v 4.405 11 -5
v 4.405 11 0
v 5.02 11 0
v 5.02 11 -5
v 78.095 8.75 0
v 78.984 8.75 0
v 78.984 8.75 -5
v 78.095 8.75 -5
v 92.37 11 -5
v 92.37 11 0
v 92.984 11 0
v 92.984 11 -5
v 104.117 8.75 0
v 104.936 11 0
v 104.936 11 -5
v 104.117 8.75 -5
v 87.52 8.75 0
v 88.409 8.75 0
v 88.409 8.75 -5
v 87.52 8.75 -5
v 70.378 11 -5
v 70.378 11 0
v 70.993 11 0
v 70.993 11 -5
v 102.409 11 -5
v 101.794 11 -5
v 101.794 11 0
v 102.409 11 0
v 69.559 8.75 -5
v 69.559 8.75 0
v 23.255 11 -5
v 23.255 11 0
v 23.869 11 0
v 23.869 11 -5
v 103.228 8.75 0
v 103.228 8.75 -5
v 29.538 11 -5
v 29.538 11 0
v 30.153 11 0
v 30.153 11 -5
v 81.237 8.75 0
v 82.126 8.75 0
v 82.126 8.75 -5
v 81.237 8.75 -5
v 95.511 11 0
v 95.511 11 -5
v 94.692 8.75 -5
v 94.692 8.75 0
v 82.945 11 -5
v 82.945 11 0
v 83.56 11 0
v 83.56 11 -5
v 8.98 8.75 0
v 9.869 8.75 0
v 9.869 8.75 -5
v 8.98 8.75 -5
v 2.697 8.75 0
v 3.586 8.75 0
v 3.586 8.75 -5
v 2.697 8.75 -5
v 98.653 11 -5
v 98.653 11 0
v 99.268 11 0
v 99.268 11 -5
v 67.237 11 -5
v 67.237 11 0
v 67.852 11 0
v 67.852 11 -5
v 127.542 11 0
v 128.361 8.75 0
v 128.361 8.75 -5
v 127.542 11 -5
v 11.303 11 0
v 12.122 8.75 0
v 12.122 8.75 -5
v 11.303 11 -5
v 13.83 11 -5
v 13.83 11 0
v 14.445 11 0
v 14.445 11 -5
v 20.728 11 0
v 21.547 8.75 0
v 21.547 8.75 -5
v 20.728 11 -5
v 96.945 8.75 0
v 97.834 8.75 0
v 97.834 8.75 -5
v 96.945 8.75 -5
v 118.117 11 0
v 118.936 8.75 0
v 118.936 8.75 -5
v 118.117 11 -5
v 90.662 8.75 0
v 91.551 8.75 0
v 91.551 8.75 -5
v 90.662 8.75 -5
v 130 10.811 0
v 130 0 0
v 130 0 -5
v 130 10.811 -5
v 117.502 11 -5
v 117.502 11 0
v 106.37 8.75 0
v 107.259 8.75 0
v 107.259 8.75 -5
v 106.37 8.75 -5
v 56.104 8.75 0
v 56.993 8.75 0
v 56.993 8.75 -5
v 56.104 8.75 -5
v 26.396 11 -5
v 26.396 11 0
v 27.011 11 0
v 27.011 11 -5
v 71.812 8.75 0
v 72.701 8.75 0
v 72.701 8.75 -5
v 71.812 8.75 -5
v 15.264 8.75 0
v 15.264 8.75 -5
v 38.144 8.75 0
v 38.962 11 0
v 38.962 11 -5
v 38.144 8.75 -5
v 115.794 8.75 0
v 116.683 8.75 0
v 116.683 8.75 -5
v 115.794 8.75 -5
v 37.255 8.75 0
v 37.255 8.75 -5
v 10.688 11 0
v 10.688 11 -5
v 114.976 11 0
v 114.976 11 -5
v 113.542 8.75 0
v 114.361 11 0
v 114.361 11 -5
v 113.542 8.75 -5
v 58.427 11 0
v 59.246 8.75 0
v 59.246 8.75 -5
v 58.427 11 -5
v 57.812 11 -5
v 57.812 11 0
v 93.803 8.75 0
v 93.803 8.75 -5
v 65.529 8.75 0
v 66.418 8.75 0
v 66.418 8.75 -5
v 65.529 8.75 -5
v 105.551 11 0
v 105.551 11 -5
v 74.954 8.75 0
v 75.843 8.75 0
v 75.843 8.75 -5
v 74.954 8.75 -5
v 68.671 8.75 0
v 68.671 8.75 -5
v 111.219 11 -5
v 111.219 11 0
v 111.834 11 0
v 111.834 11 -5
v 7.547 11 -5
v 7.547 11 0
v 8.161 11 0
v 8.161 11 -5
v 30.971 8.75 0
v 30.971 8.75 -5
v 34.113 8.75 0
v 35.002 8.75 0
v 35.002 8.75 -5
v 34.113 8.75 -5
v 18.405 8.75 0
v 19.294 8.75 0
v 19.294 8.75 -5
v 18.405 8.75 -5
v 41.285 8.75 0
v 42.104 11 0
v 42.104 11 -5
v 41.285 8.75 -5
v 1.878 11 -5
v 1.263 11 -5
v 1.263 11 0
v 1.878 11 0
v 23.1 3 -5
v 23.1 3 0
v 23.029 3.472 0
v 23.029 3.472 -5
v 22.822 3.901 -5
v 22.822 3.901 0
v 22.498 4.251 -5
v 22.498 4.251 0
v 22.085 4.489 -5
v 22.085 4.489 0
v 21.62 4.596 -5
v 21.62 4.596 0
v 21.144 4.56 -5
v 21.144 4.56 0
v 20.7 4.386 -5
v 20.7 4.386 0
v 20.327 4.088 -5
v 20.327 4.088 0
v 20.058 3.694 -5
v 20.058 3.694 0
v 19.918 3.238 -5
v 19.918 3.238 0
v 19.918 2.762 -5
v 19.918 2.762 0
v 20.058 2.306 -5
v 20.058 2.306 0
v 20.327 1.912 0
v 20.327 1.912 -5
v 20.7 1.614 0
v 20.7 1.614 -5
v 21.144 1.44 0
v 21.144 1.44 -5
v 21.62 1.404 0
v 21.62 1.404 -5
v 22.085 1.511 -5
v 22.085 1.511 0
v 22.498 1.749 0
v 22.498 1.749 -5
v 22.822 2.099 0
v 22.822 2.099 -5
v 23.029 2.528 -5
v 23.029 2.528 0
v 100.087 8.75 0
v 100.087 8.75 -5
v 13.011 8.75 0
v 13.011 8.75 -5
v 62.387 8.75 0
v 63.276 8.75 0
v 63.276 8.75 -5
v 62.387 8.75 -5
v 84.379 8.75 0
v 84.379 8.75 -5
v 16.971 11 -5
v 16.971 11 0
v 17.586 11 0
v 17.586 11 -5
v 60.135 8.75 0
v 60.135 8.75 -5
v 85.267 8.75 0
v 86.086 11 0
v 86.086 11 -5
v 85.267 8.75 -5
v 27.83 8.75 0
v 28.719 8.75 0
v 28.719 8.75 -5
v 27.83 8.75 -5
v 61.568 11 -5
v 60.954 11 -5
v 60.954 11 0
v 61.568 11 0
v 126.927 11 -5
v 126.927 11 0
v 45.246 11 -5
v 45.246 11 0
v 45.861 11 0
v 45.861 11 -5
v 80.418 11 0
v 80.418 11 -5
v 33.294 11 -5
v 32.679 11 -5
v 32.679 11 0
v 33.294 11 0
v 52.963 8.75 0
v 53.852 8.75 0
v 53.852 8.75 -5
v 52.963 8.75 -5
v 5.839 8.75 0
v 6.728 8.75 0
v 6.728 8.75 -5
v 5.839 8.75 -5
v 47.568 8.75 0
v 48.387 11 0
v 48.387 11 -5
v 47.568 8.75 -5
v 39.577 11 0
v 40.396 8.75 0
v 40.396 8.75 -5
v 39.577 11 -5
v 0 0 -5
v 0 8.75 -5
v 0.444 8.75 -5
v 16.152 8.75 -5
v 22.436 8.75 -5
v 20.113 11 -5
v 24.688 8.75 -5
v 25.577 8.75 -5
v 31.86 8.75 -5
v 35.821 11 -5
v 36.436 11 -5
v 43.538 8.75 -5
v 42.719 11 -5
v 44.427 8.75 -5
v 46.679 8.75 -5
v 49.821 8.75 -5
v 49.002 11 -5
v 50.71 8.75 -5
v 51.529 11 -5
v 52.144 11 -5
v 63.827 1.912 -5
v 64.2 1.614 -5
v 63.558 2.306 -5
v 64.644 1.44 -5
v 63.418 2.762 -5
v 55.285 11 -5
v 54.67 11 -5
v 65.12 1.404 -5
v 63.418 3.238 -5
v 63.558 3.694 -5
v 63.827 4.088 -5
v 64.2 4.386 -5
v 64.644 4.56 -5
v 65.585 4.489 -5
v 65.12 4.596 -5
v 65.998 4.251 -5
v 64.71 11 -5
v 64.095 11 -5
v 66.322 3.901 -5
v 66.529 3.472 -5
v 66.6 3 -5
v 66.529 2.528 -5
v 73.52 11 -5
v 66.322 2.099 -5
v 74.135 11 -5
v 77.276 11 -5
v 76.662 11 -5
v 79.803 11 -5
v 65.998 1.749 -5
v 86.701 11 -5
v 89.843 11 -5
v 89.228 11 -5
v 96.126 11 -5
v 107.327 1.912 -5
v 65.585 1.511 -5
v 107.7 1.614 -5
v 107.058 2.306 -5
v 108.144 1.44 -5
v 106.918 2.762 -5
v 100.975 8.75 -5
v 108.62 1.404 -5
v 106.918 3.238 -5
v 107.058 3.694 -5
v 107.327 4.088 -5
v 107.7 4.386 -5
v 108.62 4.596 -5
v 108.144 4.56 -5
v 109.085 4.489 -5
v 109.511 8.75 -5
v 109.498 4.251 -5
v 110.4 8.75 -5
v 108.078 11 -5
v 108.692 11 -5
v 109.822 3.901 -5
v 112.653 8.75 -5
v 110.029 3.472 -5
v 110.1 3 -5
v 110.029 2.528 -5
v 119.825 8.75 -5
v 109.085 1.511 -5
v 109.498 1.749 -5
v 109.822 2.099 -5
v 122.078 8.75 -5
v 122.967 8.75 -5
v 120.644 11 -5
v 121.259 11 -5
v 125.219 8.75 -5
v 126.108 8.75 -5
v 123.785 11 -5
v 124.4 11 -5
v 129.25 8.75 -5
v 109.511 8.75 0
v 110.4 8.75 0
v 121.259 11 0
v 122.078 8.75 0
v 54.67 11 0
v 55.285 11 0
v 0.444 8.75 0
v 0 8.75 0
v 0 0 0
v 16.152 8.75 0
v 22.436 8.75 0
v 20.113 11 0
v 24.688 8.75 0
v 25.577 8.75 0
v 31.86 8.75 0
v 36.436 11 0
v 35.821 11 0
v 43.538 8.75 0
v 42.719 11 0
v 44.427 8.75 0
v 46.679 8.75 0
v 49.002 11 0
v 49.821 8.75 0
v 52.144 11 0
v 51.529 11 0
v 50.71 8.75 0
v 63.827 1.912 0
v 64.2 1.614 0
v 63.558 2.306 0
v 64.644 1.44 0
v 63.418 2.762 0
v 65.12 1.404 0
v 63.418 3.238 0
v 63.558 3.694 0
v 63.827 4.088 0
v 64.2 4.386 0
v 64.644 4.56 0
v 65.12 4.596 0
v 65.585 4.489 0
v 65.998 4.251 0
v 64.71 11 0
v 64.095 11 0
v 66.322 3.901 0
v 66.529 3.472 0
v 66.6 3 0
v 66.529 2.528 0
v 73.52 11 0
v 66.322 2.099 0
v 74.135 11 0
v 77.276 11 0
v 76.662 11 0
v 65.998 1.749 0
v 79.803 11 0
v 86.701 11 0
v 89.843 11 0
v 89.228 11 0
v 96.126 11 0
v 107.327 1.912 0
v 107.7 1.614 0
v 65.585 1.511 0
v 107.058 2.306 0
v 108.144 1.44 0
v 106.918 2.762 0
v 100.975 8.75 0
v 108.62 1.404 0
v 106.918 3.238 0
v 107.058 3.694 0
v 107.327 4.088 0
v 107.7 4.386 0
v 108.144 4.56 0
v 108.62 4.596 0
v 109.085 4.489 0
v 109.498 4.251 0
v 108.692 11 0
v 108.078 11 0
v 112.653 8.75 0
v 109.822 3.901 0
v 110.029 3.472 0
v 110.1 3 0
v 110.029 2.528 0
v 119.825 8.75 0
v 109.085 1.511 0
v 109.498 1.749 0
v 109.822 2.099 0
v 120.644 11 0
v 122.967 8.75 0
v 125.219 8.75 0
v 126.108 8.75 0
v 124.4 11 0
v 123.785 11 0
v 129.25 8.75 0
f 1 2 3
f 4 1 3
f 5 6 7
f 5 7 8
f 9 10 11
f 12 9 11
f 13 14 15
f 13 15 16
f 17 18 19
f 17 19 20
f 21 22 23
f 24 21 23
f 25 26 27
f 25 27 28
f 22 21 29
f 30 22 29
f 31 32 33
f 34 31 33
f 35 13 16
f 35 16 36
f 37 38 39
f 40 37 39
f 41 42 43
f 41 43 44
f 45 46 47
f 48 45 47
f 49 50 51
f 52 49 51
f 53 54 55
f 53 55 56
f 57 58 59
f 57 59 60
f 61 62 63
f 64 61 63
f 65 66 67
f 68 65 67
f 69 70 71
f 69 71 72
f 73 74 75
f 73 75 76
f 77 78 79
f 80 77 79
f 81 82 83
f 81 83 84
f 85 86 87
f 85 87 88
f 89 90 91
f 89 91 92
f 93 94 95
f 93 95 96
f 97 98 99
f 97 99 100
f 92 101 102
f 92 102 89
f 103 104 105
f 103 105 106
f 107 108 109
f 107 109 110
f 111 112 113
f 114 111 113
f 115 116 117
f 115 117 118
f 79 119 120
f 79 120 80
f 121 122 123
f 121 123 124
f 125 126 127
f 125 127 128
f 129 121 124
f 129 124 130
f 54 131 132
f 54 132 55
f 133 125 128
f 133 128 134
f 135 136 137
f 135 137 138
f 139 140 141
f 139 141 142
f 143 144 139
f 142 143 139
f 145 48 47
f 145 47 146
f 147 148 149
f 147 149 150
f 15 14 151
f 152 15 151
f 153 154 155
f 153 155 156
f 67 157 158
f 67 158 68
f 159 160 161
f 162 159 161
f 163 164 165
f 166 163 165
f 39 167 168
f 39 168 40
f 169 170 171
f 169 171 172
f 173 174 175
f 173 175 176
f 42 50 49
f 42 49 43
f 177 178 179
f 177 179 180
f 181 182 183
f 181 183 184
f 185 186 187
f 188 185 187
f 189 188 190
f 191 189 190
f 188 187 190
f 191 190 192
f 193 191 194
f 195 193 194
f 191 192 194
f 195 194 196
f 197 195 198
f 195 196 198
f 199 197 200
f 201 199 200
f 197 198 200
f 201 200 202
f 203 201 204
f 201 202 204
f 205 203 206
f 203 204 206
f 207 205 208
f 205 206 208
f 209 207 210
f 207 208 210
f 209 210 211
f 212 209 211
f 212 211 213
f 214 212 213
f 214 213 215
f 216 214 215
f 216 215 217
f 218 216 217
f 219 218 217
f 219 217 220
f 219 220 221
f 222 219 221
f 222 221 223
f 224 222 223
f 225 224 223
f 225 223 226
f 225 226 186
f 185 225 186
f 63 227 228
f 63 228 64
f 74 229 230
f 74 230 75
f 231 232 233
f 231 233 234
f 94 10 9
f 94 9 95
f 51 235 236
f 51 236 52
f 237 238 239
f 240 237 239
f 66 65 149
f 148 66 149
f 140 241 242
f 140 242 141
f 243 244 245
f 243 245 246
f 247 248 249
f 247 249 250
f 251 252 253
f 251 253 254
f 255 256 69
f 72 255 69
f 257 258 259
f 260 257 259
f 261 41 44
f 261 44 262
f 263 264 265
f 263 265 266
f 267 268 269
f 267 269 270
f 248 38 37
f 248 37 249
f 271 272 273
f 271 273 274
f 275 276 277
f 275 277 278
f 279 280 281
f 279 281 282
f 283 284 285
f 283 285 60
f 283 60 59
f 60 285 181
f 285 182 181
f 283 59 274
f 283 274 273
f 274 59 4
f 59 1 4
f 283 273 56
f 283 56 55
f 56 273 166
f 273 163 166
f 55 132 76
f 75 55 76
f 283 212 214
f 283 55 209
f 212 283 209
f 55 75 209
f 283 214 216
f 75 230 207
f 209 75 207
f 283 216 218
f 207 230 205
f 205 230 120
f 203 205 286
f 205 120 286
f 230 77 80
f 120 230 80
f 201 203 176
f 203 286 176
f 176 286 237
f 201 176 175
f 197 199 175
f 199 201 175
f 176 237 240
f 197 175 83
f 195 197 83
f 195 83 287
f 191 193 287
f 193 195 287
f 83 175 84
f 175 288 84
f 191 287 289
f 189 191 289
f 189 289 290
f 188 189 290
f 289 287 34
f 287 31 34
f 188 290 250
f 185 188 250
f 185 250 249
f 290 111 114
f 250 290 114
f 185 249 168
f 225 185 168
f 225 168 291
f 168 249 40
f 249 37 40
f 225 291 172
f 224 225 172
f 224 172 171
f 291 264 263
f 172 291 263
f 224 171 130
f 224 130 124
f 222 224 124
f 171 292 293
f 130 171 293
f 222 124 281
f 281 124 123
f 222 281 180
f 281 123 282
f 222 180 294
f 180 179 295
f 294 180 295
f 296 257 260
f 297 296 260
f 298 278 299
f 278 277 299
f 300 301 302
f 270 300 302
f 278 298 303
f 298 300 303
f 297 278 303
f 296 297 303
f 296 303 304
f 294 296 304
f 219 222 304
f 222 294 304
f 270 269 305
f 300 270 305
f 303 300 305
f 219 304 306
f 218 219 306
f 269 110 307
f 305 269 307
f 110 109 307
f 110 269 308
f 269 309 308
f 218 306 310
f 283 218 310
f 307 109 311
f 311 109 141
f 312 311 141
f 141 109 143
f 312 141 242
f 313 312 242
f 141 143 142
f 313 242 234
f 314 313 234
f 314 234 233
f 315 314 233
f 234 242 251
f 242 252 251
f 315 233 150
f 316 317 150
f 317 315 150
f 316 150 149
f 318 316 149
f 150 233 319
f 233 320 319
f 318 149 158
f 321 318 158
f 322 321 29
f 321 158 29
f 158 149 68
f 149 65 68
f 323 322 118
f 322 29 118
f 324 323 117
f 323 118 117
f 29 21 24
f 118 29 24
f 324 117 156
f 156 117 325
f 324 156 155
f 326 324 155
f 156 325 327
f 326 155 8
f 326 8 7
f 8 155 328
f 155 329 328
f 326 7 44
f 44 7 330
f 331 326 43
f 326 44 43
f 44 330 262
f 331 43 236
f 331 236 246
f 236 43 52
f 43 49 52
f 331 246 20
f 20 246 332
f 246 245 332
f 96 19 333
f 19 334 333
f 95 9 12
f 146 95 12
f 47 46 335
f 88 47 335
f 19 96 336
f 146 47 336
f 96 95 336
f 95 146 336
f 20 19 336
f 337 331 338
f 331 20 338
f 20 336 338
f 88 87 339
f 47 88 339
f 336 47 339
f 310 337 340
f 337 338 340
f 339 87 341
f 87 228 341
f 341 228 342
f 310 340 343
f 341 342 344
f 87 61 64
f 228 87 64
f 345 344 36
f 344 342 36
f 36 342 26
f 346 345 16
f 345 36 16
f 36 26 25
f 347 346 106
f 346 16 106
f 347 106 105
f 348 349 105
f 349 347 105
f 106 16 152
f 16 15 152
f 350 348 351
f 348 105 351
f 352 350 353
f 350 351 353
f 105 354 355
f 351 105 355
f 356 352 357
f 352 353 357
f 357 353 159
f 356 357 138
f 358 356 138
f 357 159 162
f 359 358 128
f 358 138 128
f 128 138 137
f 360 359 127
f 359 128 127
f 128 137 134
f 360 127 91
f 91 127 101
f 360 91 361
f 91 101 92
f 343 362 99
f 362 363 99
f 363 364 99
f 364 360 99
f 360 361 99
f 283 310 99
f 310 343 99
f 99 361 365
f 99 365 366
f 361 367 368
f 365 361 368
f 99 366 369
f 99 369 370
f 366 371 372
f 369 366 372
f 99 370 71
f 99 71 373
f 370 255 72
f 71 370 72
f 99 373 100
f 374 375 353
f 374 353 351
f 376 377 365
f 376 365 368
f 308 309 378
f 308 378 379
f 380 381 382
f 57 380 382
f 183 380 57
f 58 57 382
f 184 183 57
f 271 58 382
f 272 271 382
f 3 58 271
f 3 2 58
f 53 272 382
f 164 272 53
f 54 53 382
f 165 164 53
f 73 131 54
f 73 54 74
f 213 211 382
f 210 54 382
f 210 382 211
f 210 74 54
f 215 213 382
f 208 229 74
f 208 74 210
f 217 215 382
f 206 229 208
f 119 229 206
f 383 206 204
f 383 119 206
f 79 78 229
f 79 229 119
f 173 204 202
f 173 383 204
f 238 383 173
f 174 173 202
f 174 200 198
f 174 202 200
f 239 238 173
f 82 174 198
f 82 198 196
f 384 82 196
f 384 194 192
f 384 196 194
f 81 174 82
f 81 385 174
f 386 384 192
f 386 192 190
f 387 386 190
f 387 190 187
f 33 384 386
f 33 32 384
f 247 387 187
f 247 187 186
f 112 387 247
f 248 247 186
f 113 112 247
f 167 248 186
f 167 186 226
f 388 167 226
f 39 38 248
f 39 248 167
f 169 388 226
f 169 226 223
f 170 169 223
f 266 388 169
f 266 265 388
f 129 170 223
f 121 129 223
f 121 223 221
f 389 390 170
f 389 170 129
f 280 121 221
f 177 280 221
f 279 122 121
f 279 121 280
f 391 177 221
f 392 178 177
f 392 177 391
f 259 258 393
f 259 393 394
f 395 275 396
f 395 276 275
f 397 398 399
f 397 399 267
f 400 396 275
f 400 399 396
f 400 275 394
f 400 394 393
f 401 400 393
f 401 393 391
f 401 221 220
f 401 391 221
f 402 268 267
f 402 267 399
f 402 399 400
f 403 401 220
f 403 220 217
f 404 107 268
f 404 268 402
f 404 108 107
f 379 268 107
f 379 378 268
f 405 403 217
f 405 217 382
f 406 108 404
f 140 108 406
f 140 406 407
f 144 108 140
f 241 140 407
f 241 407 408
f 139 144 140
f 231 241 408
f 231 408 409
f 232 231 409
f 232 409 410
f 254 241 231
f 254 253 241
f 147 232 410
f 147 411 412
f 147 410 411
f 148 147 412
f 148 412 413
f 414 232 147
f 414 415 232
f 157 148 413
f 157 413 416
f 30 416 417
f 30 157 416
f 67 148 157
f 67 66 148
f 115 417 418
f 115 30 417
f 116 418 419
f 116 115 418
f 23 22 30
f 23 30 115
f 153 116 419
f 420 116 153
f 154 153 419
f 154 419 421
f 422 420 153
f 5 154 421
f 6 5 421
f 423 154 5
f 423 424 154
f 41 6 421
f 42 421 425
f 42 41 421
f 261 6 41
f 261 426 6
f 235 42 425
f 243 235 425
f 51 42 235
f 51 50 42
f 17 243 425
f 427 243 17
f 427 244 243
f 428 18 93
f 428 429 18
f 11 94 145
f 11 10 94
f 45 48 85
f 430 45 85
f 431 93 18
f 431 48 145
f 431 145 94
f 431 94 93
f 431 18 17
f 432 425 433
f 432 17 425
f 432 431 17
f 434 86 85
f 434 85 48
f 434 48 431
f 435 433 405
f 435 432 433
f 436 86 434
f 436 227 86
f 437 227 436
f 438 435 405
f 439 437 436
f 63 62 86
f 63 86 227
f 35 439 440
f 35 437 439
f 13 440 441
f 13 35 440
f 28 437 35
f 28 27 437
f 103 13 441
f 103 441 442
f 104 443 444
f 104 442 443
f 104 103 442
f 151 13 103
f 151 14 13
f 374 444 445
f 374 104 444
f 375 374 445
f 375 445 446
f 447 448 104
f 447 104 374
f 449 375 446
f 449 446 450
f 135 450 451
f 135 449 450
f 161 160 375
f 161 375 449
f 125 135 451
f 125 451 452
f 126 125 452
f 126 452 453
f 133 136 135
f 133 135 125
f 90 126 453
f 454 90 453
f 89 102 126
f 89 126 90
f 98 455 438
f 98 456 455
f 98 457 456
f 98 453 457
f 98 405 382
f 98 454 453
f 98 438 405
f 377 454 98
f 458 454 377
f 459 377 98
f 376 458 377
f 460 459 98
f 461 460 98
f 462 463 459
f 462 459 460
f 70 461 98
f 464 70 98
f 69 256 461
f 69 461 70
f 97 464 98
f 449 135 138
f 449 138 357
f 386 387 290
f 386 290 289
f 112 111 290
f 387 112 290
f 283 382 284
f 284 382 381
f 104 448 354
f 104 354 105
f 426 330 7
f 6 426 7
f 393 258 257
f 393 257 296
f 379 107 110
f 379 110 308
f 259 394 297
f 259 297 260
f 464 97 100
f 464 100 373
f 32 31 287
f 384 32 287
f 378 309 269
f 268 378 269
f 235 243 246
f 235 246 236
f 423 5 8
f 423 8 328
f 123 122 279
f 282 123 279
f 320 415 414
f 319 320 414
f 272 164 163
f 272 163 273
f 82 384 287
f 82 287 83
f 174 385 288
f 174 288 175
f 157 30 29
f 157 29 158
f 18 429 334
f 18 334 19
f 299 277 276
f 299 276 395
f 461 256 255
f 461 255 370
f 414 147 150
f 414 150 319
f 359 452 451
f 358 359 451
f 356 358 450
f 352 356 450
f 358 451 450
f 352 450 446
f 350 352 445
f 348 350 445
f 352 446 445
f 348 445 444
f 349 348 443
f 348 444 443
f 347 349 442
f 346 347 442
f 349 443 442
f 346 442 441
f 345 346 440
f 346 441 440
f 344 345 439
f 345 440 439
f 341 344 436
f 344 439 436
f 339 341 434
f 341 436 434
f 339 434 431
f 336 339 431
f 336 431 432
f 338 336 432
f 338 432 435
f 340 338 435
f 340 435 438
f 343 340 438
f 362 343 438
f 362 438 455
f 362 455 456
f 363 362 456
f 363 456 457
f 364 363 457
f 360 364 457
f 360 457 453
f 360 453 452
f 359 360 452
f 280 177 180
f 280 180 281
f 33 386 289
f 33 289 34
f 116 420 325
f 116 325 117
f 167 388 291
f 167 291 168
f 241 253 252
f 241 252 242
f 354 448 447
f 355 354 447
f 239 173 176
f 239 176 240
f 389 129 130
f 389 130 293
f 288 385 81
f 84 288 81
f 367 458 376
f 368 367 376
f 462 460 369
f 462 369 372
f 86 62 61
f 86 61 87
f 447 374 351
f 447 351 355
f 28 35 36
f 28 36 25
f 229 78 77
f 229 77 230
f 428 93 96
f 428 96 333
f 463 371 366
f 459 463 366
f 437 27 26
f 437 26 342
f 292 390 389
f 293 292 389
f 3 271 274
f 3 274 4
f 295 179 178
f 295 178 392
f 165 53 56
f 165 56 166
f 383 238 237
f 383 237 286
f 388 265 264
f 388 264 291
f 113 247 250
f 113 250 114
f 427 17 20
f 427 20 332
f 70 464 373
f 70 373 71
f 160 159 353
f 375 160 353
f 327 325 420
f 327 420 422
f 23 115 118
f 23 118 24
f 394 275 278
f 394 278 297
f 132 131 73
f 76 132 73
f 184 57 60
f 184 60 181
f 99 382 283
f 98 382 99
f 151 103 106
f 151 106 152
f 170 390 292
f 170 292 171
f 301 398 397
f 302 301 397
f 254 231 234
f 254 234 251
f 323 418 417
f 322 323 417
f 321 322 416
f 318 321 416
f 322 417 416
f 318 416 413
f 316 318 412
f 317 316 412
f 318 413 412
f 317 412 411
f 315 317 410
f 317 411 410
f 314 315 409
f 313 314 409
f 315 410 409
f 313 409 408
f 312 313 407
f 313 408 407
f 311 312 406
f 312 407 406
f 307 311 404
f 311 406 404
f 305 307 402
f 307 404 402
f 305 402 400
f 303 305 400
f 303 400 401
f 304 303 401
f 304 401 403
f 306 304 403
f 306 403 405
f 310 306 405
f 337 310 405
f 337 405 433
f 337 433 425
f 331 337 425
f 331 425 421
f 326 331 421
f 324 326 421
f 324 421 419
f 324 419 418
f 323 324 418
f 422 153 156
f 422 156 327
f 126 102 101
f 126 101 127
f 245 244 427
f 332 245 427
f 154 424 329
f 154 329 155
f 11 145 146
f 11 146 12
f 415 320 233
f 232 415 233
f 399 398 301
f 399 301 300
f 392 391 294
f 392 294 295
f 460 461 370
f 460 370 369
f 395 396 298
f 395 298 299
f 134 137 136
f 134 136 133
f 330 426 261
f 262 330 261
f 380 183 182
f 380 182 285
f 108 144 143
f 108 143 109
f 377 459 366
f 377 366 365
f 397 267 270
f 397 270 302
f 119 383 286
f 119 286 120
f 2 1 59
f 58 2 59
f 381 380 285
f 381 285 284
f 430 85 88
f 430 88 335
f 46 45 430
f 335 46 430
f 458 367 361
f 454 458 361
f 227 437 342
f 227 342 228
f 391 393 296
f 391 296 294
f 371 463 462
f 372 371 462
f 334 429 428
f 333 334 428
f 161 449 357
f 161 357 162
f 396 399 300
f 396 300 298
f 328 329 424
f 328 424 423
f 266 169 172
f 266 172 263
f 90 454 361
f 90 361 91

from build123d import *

# Parameters (mm, degrees)
BLANKSKE_W              = 130
BLANKSKE_H              = 11
BLANK_DEPTH             = 5
TOOTHCUTSIM_DEPTH       = 131.560330882
TEETHCUTS_COUNT         = 42
TEETHCUTS_PITCH         = 3.14159265
ESQUISSE1_R             = 1.6
ENL_V_MAT_EXTRU_1_DEPTH = 10


with BuildPart() as part:
    # BlankSke → Blank (new body)
    with BuildSketch(Plane.XY):
        with Locations((65, 5.5)):
            Rectangle(BLANKSKE_W, BLANKSKE_H)
    extrude(amount=-BLANK_DEPTH)

    # TooCutSkeSim → ToothCutSim (cut, through all)
    with BuildSketch(Plane.XY):
        Polygon((0.44443537, 8.75), (-0.44443537, 8.75), (-1.272613241, 11.0254), (1.272613241, 11.0254), align=None)
    toothcutsim = extrude(amount=-TOOTHCUTSIM_DEPTH, mode=Mode.SUBTRACT)

    # TeethCuts: ToothCutSim ×42
    with Locations(*[(i * TEETHCUTS_PITCH, 0, 0) for i in range(1, TEETHCUTS_COUNT)]):
        add(toothcutsim, mode=Mode.SUBTRACT)

    # Esquisse1 → Enlèv. mat.-Extru.1 (cut)
    with BuildSketch(Plane.XY):
        with Locations((21.5, 3)):
            Circle(ESQUISSE1_R)
        with Locations((65, 3)):
            Circle(ESQUISSE1_R)
        with Locations((108.5, 3)):
            Circle(ESQUISSE1_R)
    extrude(amount=-ENL_V_MAT_EXTRU_1_DEPTH, mode=Mode.SUBTRACT)


solid = part.part
